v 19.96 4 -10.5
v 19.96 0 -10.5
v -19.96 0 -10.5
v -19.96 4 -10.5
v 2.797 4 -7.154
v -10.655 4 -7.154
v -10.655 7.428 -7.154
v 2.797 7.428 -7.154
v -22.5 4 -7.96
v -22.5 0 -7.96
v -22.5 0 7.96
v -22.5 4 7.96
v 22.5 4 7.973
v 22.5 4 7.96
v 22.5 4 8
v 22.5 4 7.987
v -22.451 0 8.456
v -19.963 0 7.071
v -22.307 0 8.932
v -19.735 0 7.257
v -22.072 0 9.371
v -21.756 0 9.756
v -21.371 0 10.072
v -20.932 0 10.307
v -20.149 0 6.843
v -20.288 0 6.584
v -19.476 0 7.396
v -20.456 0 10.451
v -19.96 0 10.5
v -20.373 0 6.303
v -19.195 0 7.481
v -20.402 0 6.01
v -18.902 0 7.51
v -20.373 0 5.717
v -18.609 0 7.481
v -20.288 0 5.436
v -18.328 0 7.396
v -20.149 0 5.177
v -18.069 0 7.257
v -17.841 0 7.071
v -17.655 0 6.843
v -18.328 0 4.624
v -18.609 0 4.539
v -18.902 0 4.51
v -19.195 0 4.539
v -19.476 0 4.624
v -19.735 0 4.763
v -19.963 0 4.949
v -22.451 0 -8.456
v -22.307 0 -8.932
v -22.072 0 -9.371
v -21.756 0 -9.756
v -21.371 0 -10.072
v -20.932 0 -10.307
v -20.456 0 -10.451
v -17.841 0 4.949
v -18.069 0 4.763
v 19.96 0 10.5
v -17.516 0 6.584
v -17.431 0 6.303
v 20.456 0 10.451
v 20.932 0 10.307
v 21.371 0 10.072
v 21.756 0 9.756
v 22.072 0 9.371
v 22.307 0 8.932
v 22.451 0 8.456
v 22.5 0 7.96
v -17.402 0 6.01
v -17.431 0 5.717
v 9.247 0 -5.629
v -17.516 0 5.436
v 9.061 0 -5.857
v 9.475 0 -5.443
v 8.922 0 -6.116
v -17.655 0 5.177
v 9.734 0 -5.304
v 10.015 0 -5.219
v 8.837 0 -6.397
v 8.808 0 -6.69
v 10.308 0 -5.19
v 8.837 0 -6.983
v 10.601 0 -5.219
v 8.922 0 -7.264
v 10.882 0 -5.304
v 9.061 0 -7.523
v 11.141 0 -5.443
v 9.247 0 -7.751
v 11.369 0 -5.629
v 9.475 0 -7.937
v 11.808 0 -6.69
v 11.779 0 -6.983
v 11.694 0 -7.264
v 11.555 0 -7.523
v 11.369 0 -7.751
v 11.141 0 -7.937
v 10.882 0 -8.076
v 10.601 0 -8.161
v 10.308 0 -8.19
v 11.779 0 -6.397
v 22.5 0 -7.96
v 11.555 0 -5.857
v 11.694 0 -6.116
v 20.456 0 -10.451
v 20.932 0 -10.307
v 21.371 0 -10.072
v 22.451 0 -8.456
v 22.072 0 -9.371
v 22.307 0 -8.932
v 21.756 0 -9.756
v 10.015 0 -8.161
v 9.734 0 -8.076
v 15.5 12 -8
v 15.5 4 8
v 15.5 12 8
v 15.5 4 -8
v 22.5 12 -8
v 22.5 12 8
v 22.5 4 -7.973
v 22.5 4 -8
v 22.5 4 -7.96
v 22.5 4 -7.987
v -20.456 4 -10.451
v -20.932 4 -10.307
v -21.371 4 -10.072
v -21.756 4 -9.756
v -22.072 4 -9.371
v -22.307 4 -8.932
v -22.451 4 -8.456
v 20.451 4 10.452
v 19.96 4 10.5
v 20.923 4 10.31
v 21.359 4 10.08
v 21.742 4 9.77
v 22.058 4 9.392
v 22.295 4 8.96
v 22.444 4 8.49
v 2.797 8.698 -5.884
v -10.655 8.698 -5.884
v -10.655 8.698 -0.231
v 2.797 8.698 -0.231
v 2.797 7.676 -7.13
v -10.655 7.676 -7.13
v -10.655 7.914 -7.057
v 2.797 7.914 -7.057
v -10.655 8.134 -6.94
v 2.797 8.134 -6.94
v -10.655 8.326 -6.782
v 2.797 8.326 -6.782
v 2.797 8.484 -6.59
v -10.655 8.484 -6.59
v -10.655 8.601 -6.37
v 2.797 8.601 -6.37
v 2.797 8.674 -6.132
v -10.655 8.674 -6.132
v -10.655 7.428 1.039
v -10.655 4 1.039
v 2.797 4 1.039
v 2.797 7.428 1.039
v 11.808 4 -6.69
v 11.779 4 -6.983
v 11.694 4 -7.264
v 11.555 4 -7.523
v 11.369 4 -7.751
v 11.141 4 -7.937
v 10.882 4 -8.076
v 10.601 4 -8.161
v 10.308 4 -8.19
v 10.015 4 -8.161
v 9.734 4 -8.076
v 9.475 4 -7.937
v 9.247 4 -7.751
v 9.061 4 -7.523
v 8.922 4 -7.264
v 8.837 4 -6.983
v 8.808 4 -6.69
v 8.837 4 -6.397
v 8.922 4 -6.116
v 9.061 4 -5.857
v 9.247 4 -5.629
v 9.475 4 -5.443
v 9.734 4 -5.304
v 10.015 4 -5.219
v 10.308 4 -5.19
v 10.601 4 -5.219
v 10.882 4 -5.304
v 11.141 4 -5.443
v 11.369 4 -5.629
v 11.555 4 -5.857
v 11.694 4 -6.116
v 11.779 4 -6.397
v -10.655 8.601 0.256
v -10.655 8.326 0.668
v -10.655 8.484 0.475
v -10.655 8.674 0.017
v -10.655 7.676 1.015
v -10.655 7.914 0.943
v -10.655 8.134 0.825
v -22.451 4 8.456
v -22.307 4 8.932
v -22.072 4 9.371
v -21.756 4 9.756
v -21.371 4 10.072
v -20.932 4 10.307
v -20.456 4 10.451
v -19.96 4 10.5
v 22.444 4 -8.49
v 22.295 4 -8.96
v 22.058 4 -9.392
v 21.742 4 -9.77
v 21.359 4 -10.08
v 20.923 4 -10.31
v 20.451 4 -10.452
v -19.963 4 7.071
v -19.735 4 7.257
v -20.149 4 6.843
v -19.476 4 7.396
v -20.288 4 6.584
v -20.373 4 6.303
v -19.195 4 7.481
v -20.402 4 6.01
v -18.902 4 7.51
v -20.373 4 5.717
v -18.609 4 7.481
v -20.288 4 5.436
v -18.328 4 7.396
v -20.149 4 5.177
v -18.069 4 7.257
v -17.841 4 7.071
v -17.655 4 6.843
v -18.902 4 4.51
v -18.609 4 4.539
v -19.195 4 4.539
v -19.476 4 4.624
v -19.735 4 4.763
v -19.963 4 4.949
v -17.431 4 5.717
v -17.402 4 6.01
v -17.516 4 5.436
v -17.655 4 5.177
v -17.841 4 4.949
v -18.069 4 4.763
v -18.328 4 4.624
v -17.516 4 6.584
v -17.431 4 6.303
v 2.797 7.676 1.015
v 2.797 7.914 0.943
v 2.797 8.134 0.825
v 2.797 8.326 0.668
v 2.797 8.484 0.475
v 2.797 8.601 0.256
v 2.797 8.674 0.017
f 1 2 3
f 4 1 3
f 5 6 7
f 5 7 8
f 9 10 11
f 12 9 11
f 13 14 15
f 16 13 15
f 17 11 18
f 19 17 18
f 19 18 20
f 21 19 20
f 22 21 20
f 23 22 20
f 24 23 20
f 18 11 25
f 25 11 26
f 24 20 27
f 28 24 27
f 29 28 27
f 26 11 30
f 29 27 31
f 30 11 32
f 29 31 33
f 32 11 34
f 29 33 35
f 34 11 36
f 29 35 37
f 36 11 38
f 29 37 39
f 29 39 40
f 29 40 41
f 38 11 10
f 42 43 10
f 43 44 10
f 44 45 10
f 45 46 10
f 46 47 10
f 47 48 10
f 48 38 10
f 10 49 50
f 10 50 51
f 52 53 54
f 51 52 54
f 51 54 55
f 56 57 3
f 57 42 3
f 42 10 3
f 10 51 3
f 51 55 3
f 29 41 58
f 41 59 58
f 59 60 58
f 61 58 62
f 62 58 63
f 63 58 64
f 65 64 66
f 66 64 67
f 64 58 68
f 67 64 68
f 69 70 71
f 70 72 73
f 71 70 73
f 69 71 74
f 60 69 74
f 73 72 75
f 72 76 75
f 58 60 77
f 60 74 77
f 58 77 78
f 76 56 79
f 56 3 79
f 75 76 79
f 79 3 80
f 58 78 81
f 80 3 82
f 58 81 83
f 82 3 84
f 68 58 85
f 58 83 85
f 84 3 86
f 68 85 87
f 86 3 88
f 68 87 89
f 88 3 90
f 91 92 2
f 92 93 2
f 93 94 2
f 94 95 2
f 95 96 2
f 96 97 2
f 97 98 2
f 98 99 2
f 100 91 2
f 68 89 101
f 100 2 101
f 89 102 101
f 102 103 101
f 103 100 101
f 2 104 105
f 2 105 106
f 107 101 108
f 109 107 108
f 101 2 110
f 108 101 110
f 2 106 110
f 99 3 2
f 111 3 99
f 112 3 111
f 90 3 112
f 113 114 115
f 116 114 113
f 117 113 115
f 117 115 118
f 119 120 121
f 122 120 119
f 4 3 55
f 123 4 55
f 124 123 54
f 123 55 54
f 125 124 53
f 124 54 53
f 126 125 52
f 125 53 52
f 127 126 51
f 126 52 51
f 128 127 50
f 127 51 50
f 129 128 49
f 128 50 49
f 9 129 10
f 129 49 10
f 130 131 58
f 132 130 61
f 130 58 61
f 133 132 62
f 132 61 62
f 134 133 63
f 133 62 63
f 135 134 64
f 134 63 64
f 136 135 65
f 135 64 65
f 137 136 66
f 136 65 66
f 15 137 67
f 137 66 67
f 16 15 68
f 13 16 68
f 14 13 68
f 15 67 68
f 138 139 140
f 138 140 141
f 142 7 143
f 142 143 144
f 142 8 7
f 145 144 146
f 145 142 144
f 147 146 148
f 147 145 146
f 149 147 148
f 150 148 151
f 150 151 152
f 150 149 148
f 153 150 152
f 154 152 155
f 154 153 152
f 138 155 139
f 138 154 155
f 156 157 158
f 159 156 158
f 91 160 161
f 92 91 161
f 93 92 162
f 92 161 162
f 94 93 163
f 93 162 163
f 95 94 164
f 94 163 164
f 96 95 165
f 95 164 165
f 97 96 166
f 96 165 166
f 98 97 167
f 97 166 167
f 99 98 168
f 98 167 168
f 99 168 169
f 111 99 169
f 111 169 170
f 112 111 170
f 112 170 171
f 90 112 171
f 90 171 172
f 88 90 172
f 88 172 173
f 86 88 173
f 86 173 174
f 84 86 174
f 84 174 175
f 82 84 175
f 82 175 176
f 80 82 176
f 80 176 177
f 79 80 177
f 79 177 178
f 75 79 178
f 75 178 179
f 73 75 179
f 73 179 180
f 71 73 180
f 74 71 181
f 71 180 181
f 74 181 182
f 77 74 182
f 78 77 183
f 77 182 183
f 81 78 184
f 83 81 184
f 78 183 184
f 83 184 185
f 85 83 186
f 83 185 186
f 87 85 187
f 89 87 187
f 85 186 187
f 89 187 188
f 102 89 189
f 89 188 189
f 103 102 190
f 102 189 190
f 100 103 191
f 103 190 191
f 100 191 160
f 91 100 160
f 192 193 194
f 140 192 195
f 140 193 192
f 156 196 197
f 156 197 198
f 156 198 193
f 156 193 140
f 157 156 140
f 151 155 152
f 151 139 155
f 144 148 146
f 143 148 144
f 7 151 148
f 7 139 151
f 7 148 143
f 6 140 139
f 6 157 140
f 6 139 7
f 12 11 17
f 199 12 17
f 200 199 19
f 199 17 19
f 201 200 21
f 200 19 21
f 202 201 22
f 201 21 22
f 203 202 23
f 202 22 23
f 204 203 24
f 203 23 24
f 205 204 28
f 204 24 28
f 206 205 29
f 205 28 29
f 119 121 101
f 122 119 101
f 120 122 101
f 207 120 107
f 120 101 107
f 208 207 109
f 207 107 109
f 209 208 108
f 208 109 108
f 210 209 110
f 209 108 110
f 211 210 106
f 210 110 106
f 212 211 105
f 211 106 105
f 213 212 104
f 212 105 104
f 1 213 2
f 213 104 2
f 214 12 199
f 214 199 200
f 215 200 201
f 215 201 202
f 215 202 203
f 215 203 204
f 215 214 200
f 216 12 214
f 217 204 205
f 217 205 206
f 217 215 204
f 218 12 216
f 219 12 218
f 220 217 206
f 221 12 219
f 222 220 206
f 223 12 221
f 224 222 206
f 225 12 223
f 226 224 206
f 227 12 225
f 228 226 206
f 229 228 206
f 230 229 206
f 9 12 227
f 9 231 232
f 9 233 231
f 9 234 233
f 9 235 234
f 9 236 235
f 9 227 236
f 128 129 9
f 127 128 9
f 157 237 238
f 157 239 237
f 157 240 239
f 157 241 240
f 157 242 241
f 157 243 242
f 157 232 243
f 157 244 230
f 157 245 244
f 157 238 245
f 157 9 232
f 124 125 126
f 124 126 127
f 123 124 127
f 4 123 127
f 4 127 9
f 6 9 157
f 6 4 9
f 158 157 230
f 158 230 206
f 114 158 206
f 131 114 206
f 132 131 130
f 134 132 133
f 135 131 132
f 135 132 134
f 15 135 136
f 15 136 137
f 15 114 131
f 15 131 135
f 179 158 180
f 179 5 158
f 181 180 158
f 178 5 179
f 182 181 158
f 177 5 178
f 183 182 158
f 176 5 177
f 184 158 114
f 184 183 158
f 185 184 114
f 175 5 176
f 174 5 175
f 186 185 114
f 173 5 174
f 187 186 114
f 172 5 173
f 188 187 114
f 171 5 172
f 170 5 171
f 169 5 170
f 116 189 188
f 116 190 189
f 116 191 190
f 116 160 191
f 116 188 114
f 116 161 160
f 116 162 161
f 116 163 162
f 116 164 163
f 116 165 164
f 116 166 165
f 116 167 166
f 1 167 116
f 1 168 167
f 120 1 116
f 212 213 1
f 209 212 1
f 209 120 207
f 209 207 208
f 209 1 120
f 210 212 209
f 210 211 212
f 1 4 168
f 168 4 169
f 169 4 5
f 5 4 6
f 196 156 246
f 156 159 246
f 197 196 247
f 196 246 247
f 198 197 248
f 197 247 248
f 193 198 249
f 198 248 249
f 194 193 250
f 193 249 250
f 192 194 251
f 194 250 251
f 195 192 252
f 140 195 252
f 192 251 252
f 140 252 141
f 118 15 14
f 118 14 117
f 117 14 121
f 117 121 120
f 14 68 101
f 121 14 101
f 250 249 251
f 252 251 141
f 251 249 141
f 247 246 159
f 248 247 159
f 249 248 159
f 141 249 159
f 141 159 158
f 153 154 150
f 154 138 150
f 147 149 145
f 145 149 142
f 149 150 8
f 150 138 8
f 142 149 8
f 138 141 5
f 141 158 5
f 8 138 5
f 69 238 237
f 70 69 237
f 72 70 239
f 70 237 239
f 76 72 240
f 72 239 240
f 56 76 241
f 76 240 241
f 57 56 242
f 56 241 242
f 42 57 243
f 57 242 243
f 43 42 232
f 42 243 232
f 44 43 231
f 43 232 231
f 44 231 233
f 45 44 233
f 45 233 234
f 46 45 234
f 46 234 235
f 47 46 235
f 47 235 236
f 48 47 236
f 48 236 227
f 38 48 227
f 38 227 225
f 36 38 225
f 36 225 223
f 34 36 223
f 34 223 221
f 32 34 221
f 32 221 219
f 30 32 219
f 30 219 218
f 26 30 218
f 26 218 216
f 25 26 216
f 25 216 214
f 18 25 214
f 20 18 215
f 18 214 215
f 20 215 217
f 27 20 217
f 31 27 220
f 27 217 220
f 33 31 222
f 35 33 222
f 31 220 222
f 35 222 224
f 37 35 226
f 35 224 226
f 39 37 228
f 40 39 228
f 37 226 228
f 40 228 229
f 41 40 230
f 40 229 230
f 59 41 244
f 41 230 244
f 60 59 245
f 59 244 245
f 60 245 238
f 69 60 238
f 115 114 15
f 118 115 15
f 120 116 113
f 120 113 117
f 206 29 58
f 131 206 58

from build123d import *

# Parameters (mm, degrees)
BOSS_EXTRUDE1_DEPTH = 4
SKETCH2_W           = 7
SKETCH2_H           = 16
BOSS_EXTRUDE2_DEPTH = 8
SKETCH3_W           = 13.452288764
SKETCH3_H           = 8.193666793
BOSS_EXTRUDE3_DEPTH = 4.698
FILLET1_R           = 1.27
SKETCH4_R           = 1.5
CUT_EXTRUDE1_DEPTH  = 5


with BuildPart() as part:
    # Sketch1 → Boss-Extrude1 (new body)
    with BuildSketch(Plane(origin=(0, 0, 0), x_dir=(1, 0, 0), z_dir=(0, 1, 0))):
        with BuildLine():
            Line((-19.96, -10.5), (19.96, -10.5))
            ThreePointArc((19.96, -10.5), (21.756051224, -9.756051224), (22.5, -7.96))
            Line((22.5, -7.96), (22.5, 7.96))
            ThreePointArc((22.5, 7.96), (21.756051224, 9.756051224), (19.96, 10.5))
            Line((19.96, 10.5), (-19.96, 10.5))
            ThreePointArc((-19.96, 10.5), (-21.756051224, 9.756051224), (-22.5, 7.96))
            Line((-22.5, 7.96), (-22.5, -7.96))
            ThreePointArc((-22.5, -7.96), (-21.756051224, -9.756051224), (-19.96, -10.5))
        make_face()
    extrude(amount=BOSS_EXTRUDE1_DEPTH)

    # Sketch2 → Boss-Extrude2 (add)
    with BuildSketch(Plane(origin=(0, 4, 0), x_dir=(1, 0, 0), z_dir=(0, 1, 0))):
        with Locations((19, 0)):
            Rectangle(SKETCH2_W, SKETCH2_H)
    extrude(amount=BOSS_EXTRUDE2_DEPTH)

    # Sketch3 → Boss-Extrude3 (add)
    with BuildSketch(Plane(origin=(0, 4, 0), x_dir=(1, 0, 0), z_dir=(0, 1, 0))):
        with Locations((-3.928679787, 3.057338356)):
            Rectangle(SKETCH3_W, SKETCH3_H)
    extrude(amount=BOSS_EXTRUDE3_DEPTH)

    # Fillet1
    fillet1_edges = [part.edges().sort_by_distance(p)[0] for p in [
        (-3.928679787, 8.698, 1.039495041),
        (-3.928679787, 8.698, -7.154171752),
    ]]
    fillet(fillet1_edges, radius=FILLET1_R)

    # Sketch4 → Cut-Extrude1 (cut, through all)
    with BuildSketch(Plane(origin=(0, 4, 0), x_dir=(1, 0, 0), z_dir=(0, 1, 0))):
        with Locations((-18.902, -6.01)):
            Circle(SKETCH4_R)
        with Locations((10.308, 6.69)):
            Circle(SKETCH4_R)
    extrude(amount=-CUT_EXTRUDE1_DEPTH, mode=Mode.SUBTRACT)


solid = part.part
